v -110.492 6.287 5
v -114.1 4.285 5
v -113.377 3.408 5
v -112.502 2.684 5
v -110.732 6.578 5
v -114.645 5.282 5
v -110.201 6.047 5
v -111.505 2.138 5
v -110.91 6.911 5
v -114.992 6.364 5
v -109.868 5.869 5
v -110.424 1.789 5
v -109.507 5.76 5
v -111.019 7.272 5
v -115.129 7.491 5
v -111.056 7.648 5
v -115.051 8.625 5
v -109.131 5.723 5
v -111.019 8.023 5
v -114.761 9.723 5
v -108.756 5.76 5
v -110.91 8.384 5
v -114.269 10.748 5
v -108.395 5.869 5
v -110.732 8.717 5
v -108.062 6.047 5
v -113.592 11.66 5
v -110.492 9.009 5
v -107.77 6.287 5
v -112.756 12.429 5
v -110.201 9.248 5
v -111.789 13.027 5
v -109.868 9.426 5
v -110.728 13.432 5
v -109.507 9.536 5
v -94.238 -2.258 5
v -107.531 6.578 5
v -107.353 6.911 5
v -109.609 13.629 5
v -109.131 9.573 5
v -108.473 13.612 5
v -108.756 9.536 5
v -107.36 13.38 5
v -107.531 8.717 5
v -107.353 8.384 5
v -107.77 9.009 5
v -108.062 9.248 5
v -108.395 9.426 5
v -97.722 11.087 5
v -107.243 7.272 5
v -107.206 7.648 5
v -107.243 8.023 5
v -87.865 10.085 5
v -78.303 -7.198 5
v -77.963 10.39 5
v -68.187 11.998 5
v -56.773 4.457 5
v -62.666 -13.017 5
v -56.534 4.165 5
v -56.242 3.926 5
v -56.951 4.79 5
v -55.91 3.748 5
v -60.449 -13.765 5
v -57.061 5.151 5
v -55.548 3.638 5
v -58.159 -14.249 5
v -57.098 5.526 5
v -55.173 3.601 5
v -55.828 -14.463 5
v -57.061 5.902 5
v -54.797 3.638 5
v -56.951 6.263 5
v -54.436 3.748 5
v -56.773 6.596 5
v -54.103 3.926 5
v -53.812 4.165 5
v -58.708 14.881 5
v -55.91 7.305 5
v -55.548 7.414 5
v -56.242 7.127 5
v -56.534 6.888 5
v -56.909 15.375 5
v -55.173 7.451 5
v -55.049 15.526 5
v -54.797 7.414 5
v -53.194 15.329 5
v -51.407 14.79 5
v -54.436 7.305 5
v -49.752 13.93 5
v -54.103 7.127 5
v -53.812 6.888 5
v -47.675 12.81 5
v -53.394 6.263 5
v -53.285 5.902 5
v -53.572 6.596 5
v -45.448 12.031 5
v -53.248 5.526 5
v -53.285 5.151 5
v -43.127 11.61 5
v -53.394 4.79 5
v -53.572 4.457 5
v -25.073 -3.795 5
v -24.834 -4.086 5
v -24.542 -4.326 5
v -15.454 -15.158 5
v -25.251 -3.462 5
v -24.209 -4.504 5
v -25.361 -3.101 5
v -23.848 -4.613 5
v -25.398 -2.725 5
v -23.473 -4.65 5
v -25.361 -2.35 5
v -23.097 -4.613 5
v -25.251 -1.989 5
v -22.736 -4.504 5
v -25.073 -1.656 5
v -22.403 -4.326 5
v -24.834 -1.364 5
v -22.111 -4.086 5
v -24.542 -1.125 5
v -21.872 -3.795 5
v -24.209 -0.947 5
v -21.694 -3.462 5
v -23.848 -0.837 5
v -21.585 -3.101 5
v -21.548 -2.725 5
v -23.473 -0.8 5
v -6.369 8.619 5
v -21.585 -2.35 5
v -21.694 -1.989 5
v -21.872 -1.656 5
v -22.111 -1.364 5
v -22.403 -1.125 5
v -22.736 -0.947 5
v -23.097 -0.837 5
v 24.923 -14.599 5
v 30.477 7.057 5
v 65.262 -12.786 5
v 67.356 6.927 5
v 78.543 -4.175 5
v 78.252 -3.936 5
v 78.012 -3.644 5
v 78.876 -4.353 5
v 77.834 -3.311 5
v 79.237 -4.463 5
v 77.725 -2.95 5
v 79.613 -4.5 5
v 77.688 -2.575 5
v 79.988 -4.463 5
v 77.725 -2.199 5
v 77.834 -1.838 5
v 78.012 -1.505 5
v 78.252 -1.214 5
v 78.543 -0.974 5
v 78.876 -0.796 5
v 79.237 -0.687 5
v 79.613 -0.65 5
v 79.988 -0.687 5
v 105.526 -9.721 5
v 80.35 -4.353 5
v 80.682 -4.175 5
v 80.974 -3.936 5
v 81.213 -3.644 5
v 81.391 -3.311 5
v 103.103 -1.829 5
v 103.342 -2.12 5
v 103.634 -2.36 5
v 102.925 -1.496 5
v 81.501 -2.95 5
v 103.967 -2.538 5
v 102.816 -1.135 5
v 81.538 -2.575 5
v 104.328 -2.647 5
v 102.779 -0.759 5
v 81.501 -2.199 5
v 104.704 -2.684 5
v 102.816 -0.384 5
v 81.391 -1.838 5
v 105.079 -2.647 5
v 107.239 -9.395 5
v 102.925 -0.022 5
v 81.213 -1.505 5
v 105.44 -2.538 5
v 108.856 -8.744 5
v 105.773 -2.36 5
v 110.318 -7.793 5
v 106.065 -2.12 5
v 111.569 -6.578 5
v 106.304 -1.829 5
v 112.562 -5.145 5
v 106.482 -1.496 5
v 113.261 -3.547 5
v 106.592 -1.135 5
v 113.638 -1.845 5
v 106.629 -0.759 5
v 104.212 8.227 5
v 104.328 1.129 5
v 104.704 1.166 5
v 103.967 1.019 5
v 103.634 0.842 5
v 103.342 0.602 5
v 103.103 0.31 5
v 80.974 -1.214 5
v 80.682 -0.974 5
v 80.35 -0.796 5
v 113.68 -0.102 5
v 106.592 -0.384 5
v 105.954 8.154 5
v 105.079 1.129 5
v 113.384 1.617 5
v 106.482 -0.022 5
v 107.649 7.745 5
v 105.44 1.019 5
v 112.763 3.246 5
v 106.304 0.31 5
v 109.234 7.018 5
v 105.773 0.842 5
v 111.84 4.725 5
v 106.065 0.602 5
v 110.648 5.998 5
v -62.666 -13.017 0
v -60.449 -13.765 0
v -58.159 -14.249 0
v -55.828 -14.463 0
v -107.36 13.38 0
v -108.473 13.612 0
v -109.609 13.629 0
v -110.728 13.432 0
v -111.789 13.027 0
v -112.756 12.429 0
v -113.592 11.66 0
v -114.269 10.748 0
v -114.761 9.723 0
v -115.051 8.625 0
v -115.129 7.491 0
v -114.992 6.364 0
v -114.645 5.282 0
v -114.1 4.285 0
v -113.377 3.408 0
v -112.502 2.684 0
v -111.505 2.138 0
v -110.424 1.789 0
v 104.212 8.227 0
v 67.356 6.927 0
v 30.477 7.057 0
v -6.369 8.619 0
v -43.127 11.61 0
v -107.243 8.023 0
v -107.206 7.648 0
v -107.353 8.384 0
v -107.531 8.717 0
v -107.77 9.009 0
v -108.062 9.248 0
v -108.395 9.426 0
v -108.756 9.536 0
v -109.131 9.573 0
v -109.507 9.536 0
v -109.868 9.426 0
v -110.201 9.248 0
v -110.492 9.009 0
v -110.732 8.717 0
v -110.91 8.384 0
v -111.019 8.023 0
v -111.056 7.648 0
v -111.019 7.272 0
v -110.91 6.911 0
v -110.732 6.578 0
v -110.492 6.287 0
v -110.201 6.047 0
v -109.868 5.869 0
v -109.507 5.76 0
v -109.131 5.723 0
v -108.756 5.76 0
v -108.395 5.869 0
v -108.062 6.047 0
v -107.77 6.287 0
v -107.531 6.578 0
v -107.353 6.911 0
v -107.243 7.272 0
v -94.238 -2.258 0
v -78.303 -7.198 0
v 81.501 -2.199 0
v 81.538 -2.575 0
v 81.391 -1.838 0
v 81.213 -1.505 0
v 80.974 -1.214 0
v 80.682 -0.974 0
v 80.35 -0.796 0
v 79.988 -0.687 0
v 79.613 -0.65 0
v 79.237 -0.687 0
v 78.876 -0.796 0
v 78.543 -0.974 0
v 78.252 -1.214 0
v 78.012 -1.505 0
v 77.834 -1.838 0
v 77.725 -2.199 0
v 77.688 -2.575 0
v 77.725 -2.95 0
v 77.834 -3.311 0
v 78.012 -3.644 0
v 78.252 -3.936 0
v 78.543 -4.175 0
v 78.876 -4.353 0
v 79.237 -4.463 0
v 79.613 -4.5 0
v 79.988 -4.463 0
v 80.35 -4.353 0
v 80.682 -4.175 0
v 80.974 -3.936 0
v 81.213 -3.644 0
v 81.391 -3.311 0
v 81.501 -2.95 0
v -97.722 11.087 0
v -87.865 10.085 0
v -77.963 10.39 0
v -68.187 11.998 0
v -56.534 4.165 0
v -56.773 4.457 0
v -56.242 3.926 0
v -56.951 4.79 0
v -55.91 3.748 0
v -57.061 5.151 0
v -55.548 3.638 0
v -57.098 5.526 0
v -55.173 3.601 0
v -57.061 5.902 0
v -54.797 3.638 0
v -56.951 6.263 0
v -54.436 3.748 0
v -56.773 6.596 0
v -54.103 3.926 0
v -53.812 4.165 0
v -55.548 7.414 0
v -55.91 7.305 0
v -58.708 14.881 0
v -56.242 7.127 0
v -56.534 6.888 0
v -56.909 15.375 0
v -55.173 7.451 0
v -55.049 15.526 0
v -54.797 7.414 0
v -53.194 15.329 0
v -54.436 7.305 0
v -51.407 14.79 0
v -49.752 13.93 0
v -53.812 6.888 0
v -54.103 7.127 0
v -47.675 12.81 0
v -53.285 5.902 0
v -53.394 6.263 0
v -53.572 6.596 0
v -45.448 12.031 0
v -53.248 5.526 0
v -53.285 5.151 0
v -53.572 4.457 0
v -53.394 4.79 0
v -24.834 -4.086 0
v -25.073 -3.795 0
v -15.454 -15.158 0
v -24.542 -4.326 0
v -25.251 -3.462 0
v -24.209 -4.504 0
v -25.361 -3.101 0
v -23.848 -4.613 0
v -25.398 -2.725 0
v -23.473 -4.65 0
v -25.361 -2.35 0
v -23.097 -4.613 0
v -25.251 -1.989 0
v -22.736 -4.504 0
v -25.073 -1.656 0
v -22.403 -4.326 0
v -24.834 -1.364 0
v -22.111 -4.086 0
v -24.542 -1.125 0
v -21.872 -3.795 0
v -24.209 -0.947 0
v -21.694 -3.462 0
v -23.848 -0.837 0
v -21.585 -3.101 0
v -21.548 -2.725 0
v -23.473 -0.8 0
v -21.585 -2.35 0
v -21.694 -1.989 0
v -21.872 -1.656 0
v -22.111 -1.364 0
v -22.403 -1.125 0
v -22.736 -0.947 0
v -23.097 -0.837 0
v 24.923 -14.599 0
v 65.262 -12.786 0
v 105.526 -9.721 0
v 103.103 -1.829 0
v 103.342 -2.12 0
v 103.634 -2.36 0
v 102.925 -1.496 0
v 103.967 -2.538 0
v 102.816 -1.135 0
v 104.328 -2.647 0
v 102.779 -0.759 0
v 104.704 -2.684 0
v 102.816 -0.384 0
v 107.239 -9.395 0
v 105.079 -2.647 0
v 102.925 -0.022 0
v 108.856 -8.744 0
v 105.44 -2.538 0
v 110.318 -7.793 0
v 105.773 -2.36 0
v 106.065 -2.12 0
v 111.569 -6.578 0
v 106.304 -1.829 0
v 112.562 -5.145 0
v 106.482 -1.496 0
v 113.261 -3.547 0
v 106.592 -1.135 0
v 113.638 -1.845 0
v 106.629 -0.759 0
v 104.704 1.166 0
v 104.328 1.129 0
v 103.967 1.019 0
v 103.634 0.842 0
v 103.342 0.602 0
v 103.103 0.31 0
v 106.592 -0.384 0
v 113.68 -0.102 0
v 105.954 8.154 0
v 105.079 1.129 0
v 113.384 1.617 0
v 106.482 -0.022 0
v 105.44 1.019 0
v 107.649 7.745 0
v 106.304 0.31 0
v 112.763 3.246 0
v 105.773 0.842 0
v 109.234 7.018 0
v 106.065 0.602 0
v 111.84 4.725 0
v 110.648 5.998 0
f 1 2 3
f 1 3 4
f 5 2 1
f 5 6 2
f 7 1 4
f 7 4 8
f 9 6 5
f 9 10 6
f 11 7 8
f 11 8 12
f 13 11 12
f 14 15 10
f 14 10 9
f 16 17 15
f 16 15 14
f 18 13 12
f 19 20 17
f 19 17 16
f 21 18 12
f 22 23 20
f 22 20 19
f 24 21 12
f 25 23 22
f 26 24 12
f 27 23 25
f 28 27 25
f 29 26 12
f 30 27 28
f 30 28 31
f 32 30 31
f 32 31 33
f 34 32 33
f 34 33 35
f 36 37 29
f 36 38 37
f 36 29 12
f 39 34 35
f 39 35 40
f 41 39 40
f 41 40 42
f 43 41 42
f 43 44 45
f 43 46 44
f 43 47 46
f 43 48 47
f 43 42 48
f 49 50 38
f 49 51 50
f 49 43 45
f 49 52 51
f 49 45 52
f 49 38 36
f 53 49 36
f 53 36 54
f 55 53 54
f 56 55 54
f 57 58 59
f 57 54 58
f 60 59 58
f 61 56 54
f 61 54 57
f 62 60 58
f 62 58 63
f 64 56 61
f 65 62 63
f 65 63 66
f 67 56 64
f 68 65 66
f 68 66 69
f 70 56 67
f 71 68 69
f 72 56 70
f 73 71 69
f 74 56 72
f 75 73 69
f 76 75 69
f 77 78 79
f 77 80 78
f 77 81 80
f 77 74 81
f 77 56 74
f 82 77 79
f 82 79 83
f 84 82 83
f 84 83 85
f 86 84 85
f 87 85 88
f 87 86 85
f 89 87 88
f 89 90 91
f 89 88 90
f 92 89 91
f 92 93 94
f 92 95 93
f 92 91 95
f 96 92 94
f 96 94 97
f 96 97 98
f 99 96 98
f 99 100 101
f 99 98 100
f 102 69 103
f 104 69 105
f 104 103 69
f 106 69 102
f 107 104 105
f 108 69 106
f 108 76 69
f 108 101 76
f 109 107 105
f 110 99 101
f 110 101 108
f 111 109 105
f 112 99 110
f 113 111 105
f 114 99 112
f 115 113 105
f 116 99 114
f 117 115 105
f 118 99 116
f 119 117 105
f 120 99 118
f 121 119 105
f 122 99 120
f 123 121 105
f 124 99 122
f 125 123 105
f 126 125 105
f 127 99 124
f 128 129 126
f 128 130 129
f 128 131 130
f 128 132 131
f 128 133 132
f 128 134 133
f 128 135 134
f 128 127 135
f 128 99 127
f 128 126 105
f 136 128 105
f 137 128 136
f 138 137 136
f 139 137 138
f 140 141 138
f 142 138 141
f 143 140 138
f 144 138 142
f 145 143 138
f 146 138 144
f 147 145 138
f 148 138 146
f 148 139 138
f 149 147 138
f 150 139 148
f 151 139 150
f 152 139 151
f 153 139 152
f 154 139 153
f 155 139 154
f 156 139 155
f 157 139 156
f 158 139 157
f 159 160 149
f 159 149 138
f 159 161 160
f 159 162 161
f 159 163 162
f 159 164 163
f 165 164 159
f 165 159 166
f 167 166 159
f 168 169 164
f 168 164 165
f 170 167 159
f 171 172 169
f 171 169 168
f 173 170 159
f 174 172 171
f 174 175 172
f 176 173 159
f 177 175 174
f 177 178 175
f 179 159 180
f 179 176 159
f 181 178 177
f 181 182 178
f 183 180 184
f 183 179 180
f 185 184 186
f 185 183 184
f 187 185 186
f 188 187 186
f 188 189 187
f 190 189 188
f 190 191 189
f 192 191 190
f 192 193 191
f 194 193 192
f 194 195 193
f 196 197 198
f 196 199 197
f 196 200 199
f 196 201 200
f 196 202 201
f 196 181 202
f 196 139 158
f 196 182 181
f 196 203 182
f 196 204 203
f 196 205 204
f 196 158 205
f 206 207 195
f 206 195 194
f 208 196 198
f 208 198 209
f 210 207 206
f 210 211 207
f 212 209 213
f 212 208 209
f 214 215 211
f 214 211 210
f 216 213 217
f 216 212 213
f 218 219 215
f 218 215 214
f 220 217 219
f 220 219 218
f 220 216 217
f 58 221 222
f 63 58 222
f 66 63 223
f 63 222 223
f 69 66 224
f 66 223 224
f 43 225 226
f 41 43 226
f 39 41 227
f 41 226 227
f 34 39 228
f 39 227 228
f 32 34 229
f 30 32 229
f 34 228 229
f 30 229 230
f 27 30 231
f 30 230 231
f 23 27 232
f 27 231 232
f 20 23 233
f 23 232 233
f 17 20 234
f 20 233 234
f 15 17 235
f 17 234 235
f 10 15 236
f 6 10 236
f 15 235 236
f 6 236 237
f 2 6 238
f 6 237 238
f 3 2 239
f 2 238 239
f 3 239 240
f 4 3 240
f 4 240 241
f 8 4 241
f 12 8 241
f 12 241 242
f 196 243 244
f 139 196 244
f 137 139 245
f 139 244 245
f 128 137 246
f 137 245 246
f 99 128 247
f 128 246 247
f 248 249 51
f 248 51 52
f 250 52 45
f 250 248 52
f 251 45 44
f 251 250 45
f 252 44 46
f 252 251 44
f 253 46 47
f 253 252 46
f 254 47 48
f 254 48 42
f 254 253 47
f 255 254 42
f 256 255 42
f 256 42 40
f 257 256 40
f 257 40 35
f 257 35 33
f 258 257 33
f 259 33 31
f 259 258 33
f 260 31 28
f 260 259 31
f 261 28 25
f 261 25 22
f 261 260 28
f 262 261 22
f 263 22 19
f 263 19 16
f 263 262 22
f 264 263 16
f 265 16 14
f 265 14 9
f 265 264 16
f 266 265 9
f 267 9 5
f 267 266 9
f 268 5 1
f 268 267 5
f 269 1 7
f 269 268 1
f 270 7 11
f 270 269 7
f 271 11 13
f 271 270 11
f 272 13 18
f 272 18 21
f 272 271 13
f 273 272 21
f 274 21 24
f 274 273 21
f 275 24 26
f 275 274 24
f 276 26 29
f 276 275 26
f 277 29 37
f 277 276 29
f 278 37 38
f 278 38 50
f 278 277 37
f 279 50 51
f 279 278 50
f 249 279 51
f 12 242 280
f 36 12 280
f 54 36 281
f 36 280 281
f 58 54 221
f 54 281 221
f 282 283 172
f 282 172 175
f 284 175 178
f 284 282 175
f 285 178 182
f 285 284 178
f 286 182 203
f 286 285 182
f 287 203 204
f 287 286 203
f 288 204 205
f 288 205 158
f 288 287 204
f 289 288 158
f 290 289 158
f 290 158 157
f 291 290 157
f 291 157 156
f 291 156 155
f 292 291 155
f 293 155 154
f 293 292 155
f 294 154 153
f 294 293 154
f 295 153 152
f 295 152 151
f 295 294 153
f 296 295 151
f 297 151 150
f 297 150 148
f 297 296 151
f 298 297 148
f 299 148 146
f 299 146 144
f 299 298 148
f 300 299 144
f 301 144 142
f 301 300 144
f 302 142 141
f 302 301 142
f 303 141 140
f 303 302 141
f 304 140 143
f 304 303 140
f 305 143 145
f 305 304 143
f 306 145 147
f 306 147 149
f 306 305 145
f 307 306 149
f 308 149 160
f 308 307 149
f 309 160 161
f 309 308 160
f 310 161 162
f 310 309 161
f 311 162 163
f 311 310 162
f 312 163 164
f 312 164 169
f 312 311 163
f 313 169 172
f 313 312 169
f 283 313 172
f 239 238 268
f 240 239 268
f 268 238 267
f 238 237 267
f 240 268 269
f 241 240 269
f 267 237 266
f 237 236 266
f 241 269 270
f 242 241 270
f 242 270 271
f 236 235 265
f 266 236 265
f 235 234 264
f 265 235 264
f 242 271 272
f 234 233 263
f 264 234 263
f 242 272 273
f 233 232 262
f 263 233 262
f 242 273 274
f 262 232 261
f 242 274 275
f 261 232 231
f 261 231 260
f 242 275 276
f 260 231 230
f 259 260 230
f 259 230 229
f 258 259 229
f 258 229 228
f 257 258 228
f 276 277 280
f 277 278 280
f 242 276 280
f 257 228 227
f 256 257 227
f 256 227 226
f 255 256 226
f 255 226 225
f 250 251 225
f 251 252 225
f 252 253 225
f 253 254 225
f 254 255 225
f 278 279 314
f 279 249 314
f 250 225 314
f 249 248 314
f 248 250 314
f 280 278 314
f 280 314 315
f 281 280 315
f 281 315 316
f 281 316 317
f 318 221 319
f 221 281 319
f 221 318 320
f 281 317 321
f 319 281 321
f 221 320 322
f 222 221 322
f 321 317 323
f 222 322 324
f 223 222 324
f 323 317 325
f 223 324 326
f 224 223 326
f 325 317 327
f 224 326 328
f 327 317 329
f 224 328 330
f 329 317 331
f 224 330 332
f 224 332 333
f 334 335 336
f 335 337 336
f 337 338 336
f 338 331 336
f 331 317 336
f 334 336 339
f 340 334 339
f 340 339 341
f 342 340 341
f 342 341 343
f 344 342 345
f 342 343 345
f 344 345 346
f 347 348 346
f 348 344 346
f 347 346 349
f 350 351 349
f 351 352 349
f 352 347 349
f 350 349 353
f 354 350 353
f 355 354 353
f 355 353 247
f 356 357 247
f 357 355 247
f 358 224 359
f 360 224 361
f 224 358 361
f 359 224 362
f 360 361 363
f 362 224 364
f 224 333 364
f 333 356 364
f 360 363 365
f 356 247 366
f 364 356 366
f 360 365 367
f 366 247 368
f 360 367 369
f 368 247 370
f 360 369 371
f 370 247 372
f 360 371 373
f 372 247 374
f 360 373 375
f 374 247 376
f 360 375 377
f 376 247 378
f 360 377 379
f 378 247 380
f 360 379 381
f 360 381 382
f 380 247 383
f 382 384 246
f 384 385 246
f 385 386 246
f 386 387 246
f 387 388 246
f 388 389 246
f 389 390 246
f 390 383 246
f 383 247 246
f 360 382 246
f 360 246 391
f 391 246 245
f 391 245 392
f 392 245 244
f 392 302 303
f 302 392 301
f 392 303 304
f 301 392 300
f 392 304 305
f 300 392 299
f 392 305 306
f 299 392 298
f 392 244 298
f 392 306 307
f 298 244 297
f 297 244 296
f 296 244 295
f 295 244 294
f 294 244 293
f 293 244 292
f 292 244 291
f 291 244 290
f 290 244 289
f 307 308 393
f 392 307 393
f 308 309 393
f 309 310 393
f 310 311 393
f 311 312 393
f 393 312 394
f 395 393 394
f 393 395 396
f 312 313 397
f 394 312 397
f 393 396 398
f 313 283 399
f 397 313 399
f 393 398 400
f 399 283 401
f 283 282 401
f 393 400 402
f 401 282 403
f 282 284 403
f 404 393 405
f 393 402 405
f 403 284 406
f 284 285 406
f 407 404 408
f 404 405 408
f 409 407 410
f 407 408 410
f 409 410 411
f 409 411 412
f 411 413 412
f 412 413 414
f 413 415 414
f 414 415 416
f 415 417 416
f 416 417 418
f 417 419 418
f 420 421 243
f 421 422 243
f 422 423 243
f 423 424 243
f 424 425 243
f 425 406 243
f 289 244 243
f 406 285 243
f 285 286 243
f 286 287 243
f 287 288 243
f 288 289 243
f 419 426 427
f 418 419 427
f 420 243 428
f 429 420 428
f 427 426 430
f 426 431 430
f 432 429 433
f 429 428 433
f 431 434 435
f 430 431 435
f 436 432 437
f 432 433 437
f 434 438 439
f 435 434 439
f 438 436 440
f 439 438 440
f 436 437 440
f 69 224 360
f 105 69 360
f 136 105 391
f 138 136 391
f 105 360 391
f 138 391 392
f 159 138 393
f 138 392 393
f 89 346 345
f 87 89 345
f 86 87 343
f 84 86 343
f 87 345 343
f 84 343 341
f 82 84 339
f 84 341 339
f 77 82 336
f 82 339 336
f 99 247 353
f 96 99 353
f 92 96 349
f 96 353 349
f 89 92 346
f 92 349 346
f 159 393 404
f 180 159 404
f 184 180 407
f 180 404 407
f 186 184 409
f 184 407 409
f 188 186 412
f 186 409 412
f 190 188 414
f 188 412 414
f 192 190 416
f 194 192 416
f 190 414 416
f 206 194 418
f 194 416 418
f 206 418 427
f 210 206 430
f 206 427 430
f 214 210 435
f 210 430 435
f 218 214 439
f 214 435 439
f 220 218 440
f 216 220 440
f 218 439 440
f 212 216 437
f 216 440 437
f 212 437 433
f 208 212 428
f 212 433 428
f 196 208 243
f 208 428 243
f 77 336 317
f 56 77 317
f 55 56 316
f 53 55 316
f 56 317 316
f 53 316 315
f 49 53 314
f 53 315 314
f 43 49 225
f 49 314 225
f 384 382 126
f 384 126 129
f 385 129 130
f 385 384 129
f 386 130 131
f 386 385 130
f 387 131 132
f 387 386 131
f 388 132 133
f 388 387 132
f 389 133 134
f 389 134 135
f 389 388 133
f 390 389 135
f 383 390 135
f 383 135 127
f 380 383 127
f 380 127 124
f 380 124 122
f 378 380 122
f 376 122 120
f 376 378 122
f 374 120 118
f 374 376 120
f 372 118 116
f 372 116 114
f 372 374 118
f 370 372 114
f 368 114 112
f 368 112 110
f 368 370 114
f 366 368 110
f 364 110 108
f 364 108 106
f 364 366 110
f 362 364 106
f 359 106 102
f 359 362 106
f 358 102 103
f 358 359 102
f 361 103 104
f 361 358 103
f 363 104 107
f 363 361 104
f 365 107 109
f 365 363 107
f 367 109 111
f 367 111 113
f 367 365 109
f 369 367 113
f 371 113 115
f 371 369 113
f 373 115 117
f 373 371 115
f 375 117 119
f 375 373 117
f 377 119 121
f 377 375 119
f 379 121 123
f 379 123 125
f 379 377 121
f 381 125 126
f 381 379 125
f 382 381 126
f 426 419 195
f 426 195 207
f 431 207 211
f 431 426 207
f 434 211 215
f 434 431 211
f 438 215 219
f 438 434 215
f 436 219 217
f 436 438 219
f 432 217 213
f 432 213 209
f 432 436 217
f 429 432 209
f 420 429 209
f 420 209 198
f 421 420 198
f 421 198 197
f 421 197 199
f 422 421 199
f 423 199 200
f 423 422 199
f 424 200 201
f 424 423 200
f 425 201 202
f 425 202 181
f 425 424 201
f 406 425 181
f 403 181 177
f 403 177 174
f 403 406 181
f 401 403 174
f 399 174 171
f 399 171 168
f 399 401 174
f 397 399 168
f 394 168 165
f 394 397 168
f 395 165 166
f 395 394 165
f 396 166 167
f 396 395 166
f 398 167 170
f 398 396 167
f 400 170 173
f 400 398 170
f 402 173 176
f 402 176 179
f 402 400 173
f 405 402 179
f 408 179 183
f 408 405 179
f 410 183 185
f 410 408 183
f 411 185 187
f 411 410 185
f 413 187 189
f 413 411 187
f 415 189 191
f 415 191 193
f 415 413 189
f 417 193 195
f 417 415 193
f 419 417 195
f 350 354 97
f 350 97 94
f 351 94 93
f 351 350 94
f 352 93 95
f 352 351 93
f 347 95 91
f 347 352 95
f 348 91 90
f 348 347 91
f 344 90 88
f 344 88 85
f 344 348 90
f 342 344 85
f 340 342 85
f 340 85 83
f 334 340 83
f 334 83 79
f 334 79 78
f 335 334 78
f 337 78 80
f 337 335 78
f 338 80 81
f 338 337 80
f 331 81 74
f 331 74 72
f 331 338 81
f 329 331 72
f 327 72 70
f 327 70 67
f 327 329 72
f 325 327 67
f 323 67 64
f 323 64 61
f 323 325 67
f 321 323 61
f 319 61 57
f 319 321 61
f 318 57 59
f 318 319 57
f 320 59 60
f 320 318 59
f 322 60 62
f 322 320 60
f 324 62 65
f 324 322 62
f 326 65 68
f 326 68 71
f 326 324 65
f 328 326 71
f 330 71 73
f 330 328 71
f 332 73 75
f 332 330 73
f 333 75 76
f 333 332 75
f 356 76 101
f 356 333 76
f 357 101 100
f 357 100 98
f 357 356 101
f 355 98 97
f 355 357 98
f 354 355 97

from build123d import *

# Parameters (mm, degrees)
ESQUISSE1_R        = 1.925
BOSS_EXTRU_1_DEPTH = 5


with BuildPart() as part:
    # Esquisse1 → Boss.-Extru.1 (new body)
    with BuildSketch(Plane.XY):
        with BuildLine():
            ThreePointArc((-55.827782292, -14.46282996), (24.922748014, -14.598984118), (105.525948354, -9.721405027))
            ThreePointArc((105.525948354, -9.721405027), (113.679539111, -0.101767596), (104.211594017, 8.227487007))
            ThreePointArc((104.211594017, 8.227487007), (30.47680307, 7.057280789), (-43.126605449, 11.609975917))
            ThreePointArc((-43.126605449, 11.609975917), (-46.576807991, 12.376745737), (-49.75182207, 13.929523614))
            ThreePointArc((-49.75182207, 13.929523614), (-54.116731069, 15.47051298), (-58.707950184, 14.880779279))
            ThreePointArc((-58.707950184, 14.880779279), (-82.908915105, 10.07391595), (-107.360082719, 13.380430803))
            ThreePointArc((-107.360082719, 13.380430803), (-114.932002243, 9.181129893), (-110.424129779, 1.788756847))
            ThreePointArc((-110.424129779, 1.788756847), (-86.236289716, -4.6172752), (-62.66641753, -13.016678668))
            ThreePointArc((-62.66641753, -13.016678668), (-59.310767285, -14.040827891), (-55.827782292, -14.46282996))
        make_face()
        with Locations((-23.472610973, -2.725250912)):
            Circle(ESQUISSE1_R, mode=Mode.SUBTRACT)
        with Locations((79.612874717, -2.574784989)):
            Circle(ESQUISSE1_R, mode=Mode.SUBTRACT)
        with Locations((-109.131234319, 7.647802958)):
            Circle(ESQUISSE1_R, mode=Mode.SUBTRACT)
        with Locations((-55.172918512, 5.526446001)):
            Circle(ESQUISSE1_R, mode=Mode.SUBTRACT)
        with Locations((104.703572766, -0.759056094)):
            Circle(ESQUISSE1_R, mode=Mode.SUBTRACT)
    extrude(amount=BOSS_EXTRU_1_DEPTH)


solid = part.part
